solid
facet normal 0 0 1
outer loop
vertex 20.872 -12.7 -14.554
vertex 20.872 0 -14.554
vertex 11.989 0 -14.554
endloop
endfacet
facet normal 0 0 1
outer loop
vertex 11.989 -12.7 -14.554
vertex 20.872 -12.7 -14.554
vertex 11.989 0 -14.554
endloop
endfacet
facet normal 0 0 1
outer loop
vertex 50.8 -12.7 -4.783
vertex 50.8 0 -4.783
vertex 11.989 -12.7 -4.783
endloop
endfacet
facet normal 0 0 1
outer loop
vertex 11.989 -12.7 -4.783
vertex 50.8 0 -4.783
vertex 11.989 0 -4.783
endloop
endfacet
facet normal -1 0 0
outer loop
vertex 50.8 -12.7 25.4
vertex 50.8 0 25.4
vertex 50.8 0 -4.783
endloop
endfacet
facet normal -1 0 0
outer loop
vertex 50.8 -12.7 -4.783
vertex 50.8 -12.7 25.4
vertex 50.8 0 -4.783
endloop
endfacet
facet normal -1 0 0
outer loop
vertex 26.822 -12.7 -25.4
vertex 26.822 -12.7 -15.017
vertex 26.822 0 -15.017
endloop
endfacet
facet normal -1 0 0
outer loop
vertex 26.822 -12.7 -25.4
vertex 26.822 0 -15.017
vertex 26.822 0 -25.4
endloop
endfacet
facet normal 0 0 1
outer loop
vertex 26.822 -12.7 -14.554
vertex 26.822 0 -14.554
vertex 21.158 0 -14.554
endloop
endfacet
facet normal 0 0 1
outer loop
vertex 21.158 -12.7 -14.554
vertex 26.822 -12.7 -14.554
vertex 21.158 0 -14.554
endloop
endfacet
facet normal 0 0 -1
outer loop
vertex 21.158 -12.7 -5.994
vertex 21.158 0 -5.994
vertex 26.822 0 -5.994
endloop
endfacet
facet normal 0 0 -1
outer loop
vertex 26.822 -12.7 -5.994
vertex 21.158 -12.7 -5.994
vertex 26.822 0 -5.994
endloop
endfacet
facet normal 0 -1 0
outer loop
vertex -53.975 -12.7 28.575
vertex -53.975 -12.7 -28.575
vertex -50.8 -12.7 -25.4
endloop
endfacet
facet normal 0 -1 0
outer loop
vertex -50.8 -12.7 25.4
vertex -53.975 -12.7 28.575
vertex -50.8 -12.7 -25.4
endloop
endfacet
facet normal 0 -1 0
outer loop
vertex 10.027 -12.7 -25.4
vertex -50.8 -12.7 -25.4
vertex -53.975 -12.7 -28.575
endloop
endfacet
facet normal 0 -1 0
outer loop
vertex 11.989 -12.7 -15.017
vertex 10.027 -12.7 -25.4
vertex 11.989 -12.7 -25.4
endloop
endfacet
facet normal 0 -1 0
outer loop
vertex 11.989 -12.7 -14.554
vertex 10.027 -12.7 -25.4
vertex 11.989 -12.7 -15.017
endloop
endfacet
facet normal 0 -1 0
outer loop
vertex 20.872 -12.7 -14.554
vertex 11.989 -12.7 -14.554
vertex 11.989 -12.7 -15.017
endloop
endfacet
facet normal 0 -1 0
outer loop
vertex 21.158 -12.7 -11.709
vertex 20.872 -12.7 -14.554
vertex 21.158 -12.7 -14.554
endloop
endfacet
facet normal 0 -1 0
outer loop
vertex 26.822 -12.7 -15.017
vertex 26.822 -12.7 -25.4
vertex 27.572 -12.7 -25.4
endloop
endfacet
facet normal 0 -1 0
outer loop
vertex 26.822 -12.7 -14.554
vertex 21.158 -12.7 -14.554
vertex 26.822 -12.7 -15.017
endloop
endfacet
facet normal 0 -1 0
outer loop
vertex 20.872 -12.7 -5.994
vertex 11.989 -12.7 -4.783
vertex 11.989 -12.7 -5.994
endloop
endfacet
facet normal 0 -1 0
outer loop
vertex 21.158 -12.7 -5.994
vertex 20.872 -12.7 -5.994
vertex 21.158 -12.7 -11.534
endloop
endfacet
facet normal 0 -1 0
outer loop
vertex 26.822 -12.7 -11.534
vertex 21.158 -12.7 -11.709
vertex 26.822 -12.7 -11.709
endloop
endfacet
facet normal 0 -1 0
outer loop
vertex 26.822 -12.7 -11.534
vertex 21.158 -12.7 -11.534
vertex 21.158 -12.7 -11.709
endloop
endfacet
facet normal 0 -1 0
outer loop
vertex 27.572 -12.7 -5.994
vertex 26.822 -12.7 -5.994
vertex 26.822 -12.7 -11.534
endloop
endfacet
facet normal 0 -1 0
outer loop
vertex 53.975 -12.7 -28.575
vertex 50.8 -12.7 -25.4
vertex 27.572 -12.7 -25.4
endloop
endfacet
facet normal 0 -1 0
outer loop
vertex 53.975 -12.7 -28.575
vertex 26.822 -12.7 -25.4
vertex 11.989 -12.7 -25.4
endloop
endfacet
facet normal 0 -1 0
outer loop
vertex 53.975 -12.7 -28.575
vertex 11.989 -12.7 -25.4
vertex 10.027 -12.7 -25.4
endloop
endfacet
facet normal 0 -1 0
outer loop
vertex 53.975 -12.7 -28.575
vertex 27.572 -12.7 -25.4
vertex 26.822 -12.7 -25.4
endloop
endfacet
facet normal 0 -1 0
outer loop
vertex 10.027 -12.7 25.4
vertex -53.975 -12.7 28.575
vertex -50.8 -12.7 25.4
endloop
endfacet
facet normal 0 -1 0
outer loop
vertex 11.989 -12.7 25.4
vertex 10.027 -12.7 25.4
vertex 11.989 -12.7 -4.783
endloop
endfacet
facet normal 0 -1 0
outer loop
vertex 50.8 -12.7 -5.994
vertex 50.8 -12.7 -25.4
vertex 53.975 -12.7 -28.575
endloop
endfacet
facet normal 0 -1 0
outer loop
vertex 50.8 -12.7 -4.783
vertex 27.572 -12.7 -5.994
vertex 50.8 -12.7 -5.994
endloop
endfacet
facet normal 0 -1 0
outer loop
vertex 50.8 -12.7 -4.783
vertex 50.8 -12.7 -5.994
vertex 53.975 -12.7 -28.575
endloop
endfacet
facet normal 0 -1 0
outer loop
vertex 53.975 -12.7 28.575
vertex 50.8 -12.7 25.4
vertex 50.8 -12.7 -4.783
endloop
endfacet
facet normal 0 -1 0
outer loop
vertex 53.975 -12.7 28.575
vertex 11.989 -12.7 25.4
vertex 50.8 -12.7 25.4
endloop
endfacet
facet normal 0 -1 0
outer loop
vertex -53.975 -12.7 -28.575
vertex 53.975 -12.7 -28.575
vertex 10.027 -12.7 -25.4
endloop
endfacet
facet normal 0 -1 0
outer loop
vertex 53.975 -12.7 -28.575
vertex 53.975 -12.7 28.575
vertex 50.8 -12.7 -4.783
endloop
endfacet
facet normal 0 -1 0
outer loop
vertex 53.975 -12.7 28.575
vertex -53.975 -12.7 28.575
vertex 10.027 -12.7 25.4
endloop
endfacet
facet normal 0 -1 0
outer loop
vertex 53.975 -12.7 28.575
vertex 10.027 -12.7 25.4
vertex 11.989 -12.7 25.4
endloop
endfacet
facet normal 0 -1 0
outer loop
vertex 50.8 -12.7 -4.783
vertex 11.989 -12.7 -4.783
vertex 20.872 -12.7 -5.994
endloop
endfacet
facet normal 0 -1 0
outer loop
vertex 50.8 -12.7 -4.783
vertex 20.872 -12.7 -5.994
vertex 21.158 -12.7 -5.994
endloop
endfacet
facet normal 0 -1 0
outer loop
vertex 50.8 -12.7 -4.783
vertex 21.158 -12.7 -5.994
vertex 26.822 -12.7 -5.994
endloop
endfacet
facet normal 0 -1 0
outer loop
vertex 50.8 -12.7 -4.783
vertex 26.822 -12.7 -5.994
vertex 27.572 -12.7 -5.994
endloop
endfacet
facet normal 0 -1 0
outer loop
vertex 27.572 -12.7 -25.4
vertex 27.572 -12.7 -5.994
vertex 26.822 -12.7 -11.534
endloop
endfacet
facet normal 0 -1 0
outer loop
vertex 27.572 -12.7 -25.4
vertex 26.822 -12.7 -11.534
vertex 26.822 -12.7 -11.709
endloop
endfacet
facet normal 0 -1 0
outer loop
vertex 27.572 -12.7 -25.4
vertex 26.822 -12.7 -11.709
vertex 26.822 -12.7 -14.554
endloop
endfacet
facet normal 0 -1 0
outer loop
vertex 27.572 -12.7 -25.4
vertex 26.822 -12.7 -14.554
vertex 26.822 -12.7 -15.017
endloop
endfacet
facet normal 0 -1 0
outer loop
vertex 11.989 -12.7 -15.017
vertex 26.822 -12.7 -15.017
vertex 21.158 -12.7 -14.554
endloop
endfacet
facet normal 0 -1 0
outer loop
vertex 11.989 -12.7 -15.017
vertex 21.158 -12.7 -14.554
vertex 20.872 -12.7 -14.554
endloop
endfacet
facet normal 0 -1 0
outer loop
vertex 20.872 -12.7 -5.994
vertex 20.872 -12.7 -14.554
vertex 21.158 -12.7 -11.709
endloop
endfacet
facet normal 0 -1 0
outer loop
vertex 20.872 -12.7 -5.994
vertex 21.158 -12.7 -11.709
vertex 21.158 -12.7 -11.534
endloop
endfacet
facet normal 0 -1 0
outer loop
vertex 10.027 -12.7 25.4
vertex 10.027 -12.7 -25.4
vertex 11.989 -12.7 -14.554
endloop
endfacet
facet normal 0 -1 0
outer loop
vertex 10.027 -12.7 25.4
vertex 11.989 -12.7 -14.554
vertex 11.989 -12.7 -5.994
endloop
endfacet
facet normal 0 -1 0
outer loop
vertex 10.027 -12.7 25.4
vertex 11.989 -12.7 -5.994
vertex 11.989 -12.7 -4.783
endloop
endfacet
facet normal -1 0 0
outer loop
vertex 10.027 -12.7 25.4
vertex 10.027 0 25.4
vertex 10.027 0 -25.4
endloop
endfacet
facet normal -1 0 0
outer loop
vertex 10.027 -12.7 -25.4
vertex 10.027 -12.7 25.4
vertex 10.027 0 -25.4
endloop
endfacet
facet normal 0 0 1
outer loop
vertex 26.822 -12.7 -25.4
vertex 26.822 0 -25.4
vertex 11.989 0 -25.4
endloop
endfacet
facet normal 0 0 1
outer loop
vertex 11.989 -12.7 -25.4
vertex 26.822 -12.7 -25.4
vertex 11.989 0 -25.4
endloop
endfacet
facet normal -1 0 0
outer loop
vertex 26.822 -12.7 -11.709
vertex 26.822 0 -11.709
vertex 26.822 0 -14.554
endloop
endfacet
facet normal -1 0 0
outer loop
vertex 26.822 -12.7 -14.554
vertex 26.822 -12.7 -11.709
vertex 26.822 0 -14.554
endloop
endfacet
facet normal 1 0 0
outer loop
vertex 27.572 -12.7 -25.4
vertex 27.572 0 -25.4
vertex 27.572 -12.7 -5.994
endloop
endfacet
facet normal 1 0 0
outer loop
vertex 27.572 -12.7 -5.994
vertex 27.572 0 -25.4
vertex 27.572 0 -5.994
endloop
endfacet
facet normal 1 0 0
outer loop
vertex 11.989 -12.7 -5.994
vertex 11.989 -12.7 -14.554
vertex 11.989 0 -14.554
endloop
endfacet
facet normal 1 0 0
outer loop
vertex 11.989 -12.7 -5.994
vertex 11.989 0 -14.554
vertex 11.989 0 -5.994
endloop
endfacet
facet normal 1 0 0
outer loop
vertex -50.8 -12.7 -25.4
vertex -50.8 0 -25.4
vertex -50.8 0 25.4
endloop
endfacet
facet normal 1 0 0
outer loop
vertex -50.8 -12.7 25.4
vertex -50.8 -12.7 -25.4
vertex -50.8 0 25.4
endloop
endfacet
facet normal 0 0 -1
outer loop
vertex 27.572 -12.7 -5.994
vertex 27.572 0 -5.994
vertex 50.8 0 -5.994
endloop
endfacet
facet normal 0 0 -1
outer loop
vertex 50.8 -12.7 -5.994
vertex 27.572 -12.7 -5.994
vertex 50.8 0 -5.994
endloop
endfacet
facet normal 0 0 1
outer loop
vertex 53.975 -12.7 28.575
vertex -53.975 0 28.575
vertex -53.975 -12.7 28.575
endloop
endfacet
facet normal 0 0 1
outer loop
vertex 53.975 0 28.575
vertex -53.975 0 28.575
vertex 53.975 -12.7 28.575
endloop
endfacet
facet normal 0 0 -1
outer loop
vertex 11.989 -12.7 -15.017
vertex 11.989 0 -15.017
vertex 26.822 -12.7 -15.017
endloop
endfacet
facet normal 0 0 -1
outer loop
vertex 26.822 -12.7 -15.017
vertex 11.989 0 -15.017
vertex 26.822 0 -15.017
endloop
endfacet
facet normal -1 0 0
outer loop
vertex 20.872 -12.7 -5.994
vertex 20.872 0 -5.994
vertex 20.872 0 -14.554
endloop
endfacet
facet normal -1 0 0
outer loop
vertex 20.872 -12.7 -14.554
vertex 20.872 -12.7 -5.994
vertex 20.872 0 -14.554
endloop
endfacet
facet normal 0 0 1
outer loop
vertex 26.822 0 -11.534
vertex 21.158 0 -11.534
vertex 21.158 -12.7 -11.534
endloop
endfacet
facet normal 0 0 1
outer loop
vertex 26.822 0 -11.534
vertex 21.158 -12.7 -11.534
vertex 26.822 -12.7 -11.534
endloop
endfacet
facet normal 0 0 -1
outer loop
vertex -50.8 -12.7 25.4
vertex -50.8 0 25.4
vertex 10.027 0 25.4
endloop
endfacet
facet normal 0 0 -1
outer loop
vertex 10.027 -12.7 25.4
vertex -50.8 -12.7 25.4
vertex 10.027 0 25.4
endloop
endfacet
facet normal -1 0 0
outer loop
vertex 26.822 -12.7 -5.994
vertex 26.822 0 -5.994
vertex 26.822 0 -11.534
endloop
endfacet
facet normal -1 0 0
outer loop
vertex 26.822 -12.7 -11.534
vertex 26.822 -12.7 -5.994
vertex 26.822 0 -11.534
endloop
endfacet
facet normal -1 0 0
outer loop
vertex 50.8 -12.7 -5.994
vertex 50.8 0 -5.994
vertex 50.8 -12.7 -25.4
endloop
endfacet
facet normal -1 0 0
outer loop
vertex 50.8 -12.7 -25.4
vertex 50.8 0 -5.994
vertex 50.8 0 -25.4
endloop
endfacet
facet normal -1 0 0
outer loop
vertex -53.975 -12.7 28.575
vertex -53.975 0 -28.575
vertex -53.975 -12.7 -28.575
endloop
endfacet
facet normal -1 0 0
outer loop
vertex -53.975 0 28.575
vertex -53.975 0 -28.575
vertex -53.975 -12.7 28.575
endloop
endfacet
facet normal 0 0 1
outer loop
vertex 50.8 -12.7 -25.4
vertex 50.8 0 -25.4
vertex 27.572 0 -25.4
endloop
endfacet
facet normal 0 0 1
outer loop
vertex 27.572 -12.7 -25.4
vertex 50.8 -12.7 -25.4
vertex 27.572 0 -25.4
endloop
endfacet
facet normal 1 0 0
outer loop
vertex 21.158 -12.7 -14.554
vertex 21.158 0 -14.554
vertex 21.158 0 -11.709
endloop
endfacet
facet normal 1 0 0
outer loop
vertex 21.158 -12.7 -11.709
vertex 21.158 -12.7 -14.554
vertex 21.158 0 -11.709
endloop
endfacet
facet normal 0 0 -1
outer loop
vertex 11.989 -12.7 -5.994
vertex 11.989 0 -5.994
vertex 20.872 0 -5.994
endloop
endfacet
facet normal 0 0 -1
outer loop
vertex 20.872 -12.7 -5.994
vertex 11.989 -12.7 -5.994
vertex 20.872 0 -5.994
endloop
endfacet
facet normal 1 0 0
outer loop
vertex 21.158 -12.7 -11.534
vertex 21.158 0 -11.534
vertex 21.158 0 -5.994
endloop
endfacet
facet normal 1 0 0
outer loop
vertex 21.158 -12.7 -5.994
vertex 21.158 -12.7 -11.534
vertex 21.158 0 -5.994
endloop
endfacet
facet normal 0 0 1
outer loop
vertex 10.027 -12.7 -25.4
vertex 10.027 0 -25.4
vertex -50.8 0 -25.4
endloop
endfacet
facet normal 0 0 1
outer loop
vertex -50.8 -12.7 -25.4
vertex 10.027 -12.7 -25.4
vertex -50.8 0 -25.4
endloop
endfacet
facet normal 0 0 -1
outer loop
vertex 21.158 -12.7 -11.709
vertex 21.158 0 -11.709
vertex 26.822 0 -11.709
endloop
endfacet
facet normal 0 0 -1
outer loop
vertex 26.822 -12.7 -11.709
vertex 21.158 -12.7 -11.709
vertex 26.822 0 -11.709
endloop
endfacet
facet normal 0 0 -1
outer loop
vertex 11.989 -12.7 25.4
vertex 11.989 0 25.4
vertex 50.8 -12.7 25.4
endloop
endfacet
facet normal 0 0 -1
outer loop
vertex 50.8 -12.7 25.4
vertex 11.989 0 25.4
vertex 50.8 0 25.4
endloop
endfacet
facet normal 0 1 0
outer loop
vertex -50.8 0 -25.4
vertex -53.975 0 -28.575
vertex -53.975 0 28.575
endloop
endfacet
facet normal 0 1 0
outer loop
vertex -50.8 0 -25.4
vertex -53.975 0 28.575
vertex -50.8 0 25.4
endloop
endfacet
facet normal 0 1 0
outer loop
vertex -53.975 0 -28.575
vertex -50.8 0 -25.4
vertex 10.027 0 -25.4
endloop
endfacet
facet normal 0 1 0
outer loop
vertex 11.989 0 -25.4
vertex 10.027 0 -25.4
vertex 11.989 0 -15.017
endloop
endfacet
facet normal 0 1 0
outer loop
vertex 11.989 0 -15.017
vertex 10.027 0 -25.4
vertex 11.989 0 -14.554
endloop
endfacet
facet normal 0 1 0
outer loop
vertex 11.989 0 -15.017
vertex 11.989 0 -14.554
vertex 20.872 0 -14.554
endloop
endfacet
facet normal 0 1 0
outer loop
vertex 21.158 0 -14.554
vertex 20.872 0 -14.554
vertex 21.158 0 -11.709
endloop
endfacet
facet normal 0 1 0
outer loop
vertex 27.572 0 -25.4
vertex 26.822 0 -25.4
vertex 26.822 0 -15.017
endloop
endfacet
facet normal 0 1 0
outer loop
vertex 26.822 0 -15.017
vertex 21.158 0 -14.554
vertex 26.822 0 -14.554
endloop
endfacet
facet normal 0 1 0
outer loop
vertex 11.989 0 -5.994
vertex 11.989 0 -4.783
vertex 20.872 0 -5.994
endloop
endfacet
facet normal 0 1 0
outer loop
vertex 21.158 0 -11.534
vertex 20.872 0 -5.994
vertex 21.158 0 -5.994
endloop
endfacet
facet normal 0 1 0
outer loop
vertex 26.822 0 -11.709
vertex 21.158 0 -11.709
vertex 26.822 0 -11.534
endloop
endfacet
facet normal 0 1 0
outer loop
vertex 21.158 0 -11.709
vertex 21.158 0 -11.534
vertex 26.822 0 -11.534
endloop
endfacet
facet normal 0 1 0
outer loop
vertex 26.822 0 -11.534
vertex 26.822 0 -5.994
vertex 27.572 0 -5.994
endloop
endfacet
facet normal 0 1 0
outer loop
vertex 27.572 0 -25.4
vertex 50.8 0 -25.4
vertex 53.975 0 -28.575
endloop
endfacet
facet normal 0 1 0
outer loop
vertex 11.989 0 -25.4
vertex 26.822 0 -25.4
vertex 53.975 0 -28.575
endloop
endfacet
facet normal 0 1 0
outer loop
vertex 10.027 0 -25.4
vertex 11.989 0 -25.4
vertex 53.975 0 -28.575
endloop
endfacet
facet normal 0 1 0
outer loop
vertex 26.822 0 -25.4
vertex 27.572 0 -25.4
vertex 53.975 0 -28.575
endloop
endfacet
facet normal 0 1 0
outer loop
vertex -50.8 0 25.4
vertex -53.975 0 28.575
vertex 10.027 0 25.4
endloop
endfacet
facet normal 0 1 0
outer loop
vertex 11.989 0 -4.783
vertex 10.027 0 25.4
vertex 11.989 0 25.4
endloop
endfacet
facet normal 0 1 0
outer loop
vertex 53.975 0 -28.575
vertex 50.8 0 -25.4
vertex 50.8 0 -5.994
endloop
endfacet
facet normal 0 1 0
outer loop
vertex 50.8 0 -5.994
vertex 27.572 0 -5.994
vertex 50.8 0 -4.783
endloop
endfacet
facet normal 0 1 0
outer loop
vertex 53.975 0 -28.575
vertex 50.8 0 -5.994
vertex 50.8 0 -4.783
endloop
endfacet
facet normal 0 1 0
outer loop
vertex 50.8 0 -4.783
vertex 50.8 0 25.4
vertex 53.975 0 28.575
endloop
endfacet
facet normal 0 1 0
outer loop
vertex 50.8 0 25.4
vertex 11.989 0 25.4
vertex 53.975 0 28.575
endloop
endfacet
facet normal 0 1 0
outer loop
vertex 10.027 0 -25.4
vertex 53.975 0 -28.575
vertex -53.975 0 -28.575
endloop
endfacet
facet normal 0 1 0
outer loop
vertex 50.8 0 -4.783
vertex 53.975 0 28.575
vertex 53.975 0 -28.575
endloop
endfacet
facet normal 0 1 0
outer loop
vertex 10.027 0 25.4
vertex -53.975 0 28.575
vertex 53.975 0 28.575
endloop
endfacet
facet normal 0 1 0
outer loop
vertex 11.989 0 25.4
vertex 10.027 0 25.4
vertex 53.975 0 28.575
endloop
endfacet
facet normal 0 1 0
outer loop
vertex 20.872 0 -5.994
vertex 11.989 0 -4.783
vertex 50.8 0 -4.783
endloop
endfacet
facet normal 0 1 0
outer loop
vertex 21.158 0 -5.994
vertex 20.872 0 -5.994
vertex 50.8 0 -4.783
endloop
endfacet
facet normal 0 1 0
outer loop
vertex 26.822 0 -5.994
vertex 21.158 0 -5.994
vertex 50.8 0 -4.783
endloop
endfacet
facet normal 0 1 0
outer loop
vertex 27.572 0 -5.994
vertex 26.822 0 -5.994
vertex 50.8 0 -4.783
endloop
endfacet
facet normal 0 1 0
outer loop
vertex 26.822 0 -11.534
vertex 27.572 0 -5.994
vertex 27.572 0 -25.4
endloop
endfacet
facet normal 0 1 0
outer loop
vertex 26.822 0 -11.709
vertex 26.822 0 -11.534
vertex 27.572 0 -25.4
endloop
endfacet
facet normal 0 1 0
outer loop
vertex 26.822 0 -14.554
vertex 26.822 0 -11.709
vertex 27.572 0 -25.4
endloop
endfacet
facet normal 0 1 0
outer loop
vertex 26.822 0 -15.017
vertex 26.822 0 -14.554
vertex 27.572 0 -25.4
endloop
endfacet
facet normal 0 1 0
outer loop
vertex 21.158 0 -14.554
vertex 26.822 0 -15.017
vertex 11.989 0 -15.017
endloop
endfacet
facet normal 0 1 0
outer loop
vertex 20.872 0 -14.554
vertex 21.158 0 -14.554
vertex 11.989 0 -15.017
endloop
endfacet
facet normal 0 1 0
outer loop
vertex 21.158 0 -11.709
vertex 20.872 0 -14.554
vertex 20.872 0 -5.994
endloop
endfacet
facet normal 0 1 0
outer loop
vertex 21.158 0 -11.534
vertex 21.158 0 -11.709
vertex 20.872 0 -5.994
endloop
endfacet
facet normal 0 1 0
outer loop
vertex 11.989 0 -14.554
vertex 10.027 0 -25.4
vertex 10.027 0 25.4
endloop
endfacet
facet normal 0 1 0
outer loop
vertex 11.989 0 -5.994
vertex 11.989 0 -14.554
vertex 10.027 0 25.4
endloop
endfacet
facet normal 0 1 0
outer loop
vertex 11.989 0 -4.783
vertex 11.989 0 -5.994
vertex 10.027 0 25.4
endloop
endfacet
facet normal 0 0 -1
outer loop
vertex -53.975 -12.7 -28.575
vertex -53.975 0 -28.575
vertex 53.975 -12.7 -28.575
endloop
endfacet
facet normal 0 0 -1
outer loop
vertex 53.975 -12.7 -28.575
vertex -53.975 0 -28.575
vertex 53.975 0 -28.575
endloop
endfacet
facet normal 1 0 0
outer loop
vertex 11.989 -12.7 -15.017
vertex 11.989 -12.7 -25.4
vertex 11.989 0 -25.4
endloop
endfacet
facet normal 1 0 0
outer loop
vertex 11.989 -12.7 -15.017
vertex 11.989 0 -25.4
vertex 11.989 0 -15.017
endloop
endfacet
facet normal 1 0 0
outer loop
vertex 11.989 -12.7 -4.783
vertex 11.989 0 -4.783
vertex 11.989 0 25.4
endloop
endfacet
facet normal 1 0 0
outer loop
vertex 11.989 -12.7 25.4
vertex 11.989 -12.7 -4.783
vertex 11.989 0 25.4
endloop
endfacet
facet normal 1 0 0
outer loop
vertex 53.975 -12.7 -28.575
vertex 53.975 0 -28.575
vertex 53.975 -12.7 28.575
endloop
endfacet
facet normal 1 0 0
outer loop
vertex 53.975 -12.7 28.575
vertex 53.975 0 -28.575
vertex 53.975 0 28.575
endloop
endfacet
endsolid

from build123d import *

# Parameters (mm, degrees)
F0_W     = 107.95
F0_H     = 57.15
F0_W_2   = 5.6642
F0_H_2   = 0.17526
F1_DEPTH = 12.7


with BuildPart() as f1:
    # F0 (on Front) → F1 (new body)
    with BuildSketch(Plane.XZ):
        Rectangle(F0_W, F0_H)
        Polygon((50.8, -5.9944), (50.8, -25.4), (27.5717, -25.4), (26.8224, -25.4), (11.9888, -25.4), (10.02665, -25.4), (-50.8, -25.4), (-50.8, 25.4), (10.02665, 25.4), (11.9888, 25.4), (50.8, 25.4), (50.8, -4.78282), align=None, mode=Mode.SUBTRACT)
        Polygon((10.02665, -25.4), (11.9888, -25.4), (11.9888, -15.017242), (11.9888, -14.5542), (11.9888, -5.9944), (11.9888, -4.78282), (11.9888, 25.4), (10.02665, 25.4), align=None)
        Polygon((27.5717, -5.9944), (50.8, -5.9944), (50.8, -4.78282), (11.9888, -4.78282), (11.9888, -5.9944), (20.872196, -5.9944), (21.1582, -5.9944), (26.8224, -5.9944), align=None)
        Polygon((26.8224, -25.4), (27.5717, -25.4), (27.5717, -5.9944), (26.8224, -5.9944), (26.8224, -11.53414), (26.8224, -11.7094), (26.8224, -14.5542), (26.8224, -15.017242), align=None)
        Polygon((11.9888, -15.017242), (26.8224, -15.017242), (26.8224, -14.5542), (21.1582, -14.5542), (20.872196, -14.5542), (19.4056, -14.5542), (11.9888, -14.5542), align=None)
        Polygon((21.1582, -11.53414), (21.1582, -5.9944), (20.872196, -5.9944), (20.872196, -14.5542), (21.1582, -14.5542), (21.1582, -11.7094), align=None)
        with Locations((23.9903, -11.62177)):
            Rectangle(F0_W_2, F0_H_2)
    extrude(amount=F1_DEPTH)


solid = f1.part
